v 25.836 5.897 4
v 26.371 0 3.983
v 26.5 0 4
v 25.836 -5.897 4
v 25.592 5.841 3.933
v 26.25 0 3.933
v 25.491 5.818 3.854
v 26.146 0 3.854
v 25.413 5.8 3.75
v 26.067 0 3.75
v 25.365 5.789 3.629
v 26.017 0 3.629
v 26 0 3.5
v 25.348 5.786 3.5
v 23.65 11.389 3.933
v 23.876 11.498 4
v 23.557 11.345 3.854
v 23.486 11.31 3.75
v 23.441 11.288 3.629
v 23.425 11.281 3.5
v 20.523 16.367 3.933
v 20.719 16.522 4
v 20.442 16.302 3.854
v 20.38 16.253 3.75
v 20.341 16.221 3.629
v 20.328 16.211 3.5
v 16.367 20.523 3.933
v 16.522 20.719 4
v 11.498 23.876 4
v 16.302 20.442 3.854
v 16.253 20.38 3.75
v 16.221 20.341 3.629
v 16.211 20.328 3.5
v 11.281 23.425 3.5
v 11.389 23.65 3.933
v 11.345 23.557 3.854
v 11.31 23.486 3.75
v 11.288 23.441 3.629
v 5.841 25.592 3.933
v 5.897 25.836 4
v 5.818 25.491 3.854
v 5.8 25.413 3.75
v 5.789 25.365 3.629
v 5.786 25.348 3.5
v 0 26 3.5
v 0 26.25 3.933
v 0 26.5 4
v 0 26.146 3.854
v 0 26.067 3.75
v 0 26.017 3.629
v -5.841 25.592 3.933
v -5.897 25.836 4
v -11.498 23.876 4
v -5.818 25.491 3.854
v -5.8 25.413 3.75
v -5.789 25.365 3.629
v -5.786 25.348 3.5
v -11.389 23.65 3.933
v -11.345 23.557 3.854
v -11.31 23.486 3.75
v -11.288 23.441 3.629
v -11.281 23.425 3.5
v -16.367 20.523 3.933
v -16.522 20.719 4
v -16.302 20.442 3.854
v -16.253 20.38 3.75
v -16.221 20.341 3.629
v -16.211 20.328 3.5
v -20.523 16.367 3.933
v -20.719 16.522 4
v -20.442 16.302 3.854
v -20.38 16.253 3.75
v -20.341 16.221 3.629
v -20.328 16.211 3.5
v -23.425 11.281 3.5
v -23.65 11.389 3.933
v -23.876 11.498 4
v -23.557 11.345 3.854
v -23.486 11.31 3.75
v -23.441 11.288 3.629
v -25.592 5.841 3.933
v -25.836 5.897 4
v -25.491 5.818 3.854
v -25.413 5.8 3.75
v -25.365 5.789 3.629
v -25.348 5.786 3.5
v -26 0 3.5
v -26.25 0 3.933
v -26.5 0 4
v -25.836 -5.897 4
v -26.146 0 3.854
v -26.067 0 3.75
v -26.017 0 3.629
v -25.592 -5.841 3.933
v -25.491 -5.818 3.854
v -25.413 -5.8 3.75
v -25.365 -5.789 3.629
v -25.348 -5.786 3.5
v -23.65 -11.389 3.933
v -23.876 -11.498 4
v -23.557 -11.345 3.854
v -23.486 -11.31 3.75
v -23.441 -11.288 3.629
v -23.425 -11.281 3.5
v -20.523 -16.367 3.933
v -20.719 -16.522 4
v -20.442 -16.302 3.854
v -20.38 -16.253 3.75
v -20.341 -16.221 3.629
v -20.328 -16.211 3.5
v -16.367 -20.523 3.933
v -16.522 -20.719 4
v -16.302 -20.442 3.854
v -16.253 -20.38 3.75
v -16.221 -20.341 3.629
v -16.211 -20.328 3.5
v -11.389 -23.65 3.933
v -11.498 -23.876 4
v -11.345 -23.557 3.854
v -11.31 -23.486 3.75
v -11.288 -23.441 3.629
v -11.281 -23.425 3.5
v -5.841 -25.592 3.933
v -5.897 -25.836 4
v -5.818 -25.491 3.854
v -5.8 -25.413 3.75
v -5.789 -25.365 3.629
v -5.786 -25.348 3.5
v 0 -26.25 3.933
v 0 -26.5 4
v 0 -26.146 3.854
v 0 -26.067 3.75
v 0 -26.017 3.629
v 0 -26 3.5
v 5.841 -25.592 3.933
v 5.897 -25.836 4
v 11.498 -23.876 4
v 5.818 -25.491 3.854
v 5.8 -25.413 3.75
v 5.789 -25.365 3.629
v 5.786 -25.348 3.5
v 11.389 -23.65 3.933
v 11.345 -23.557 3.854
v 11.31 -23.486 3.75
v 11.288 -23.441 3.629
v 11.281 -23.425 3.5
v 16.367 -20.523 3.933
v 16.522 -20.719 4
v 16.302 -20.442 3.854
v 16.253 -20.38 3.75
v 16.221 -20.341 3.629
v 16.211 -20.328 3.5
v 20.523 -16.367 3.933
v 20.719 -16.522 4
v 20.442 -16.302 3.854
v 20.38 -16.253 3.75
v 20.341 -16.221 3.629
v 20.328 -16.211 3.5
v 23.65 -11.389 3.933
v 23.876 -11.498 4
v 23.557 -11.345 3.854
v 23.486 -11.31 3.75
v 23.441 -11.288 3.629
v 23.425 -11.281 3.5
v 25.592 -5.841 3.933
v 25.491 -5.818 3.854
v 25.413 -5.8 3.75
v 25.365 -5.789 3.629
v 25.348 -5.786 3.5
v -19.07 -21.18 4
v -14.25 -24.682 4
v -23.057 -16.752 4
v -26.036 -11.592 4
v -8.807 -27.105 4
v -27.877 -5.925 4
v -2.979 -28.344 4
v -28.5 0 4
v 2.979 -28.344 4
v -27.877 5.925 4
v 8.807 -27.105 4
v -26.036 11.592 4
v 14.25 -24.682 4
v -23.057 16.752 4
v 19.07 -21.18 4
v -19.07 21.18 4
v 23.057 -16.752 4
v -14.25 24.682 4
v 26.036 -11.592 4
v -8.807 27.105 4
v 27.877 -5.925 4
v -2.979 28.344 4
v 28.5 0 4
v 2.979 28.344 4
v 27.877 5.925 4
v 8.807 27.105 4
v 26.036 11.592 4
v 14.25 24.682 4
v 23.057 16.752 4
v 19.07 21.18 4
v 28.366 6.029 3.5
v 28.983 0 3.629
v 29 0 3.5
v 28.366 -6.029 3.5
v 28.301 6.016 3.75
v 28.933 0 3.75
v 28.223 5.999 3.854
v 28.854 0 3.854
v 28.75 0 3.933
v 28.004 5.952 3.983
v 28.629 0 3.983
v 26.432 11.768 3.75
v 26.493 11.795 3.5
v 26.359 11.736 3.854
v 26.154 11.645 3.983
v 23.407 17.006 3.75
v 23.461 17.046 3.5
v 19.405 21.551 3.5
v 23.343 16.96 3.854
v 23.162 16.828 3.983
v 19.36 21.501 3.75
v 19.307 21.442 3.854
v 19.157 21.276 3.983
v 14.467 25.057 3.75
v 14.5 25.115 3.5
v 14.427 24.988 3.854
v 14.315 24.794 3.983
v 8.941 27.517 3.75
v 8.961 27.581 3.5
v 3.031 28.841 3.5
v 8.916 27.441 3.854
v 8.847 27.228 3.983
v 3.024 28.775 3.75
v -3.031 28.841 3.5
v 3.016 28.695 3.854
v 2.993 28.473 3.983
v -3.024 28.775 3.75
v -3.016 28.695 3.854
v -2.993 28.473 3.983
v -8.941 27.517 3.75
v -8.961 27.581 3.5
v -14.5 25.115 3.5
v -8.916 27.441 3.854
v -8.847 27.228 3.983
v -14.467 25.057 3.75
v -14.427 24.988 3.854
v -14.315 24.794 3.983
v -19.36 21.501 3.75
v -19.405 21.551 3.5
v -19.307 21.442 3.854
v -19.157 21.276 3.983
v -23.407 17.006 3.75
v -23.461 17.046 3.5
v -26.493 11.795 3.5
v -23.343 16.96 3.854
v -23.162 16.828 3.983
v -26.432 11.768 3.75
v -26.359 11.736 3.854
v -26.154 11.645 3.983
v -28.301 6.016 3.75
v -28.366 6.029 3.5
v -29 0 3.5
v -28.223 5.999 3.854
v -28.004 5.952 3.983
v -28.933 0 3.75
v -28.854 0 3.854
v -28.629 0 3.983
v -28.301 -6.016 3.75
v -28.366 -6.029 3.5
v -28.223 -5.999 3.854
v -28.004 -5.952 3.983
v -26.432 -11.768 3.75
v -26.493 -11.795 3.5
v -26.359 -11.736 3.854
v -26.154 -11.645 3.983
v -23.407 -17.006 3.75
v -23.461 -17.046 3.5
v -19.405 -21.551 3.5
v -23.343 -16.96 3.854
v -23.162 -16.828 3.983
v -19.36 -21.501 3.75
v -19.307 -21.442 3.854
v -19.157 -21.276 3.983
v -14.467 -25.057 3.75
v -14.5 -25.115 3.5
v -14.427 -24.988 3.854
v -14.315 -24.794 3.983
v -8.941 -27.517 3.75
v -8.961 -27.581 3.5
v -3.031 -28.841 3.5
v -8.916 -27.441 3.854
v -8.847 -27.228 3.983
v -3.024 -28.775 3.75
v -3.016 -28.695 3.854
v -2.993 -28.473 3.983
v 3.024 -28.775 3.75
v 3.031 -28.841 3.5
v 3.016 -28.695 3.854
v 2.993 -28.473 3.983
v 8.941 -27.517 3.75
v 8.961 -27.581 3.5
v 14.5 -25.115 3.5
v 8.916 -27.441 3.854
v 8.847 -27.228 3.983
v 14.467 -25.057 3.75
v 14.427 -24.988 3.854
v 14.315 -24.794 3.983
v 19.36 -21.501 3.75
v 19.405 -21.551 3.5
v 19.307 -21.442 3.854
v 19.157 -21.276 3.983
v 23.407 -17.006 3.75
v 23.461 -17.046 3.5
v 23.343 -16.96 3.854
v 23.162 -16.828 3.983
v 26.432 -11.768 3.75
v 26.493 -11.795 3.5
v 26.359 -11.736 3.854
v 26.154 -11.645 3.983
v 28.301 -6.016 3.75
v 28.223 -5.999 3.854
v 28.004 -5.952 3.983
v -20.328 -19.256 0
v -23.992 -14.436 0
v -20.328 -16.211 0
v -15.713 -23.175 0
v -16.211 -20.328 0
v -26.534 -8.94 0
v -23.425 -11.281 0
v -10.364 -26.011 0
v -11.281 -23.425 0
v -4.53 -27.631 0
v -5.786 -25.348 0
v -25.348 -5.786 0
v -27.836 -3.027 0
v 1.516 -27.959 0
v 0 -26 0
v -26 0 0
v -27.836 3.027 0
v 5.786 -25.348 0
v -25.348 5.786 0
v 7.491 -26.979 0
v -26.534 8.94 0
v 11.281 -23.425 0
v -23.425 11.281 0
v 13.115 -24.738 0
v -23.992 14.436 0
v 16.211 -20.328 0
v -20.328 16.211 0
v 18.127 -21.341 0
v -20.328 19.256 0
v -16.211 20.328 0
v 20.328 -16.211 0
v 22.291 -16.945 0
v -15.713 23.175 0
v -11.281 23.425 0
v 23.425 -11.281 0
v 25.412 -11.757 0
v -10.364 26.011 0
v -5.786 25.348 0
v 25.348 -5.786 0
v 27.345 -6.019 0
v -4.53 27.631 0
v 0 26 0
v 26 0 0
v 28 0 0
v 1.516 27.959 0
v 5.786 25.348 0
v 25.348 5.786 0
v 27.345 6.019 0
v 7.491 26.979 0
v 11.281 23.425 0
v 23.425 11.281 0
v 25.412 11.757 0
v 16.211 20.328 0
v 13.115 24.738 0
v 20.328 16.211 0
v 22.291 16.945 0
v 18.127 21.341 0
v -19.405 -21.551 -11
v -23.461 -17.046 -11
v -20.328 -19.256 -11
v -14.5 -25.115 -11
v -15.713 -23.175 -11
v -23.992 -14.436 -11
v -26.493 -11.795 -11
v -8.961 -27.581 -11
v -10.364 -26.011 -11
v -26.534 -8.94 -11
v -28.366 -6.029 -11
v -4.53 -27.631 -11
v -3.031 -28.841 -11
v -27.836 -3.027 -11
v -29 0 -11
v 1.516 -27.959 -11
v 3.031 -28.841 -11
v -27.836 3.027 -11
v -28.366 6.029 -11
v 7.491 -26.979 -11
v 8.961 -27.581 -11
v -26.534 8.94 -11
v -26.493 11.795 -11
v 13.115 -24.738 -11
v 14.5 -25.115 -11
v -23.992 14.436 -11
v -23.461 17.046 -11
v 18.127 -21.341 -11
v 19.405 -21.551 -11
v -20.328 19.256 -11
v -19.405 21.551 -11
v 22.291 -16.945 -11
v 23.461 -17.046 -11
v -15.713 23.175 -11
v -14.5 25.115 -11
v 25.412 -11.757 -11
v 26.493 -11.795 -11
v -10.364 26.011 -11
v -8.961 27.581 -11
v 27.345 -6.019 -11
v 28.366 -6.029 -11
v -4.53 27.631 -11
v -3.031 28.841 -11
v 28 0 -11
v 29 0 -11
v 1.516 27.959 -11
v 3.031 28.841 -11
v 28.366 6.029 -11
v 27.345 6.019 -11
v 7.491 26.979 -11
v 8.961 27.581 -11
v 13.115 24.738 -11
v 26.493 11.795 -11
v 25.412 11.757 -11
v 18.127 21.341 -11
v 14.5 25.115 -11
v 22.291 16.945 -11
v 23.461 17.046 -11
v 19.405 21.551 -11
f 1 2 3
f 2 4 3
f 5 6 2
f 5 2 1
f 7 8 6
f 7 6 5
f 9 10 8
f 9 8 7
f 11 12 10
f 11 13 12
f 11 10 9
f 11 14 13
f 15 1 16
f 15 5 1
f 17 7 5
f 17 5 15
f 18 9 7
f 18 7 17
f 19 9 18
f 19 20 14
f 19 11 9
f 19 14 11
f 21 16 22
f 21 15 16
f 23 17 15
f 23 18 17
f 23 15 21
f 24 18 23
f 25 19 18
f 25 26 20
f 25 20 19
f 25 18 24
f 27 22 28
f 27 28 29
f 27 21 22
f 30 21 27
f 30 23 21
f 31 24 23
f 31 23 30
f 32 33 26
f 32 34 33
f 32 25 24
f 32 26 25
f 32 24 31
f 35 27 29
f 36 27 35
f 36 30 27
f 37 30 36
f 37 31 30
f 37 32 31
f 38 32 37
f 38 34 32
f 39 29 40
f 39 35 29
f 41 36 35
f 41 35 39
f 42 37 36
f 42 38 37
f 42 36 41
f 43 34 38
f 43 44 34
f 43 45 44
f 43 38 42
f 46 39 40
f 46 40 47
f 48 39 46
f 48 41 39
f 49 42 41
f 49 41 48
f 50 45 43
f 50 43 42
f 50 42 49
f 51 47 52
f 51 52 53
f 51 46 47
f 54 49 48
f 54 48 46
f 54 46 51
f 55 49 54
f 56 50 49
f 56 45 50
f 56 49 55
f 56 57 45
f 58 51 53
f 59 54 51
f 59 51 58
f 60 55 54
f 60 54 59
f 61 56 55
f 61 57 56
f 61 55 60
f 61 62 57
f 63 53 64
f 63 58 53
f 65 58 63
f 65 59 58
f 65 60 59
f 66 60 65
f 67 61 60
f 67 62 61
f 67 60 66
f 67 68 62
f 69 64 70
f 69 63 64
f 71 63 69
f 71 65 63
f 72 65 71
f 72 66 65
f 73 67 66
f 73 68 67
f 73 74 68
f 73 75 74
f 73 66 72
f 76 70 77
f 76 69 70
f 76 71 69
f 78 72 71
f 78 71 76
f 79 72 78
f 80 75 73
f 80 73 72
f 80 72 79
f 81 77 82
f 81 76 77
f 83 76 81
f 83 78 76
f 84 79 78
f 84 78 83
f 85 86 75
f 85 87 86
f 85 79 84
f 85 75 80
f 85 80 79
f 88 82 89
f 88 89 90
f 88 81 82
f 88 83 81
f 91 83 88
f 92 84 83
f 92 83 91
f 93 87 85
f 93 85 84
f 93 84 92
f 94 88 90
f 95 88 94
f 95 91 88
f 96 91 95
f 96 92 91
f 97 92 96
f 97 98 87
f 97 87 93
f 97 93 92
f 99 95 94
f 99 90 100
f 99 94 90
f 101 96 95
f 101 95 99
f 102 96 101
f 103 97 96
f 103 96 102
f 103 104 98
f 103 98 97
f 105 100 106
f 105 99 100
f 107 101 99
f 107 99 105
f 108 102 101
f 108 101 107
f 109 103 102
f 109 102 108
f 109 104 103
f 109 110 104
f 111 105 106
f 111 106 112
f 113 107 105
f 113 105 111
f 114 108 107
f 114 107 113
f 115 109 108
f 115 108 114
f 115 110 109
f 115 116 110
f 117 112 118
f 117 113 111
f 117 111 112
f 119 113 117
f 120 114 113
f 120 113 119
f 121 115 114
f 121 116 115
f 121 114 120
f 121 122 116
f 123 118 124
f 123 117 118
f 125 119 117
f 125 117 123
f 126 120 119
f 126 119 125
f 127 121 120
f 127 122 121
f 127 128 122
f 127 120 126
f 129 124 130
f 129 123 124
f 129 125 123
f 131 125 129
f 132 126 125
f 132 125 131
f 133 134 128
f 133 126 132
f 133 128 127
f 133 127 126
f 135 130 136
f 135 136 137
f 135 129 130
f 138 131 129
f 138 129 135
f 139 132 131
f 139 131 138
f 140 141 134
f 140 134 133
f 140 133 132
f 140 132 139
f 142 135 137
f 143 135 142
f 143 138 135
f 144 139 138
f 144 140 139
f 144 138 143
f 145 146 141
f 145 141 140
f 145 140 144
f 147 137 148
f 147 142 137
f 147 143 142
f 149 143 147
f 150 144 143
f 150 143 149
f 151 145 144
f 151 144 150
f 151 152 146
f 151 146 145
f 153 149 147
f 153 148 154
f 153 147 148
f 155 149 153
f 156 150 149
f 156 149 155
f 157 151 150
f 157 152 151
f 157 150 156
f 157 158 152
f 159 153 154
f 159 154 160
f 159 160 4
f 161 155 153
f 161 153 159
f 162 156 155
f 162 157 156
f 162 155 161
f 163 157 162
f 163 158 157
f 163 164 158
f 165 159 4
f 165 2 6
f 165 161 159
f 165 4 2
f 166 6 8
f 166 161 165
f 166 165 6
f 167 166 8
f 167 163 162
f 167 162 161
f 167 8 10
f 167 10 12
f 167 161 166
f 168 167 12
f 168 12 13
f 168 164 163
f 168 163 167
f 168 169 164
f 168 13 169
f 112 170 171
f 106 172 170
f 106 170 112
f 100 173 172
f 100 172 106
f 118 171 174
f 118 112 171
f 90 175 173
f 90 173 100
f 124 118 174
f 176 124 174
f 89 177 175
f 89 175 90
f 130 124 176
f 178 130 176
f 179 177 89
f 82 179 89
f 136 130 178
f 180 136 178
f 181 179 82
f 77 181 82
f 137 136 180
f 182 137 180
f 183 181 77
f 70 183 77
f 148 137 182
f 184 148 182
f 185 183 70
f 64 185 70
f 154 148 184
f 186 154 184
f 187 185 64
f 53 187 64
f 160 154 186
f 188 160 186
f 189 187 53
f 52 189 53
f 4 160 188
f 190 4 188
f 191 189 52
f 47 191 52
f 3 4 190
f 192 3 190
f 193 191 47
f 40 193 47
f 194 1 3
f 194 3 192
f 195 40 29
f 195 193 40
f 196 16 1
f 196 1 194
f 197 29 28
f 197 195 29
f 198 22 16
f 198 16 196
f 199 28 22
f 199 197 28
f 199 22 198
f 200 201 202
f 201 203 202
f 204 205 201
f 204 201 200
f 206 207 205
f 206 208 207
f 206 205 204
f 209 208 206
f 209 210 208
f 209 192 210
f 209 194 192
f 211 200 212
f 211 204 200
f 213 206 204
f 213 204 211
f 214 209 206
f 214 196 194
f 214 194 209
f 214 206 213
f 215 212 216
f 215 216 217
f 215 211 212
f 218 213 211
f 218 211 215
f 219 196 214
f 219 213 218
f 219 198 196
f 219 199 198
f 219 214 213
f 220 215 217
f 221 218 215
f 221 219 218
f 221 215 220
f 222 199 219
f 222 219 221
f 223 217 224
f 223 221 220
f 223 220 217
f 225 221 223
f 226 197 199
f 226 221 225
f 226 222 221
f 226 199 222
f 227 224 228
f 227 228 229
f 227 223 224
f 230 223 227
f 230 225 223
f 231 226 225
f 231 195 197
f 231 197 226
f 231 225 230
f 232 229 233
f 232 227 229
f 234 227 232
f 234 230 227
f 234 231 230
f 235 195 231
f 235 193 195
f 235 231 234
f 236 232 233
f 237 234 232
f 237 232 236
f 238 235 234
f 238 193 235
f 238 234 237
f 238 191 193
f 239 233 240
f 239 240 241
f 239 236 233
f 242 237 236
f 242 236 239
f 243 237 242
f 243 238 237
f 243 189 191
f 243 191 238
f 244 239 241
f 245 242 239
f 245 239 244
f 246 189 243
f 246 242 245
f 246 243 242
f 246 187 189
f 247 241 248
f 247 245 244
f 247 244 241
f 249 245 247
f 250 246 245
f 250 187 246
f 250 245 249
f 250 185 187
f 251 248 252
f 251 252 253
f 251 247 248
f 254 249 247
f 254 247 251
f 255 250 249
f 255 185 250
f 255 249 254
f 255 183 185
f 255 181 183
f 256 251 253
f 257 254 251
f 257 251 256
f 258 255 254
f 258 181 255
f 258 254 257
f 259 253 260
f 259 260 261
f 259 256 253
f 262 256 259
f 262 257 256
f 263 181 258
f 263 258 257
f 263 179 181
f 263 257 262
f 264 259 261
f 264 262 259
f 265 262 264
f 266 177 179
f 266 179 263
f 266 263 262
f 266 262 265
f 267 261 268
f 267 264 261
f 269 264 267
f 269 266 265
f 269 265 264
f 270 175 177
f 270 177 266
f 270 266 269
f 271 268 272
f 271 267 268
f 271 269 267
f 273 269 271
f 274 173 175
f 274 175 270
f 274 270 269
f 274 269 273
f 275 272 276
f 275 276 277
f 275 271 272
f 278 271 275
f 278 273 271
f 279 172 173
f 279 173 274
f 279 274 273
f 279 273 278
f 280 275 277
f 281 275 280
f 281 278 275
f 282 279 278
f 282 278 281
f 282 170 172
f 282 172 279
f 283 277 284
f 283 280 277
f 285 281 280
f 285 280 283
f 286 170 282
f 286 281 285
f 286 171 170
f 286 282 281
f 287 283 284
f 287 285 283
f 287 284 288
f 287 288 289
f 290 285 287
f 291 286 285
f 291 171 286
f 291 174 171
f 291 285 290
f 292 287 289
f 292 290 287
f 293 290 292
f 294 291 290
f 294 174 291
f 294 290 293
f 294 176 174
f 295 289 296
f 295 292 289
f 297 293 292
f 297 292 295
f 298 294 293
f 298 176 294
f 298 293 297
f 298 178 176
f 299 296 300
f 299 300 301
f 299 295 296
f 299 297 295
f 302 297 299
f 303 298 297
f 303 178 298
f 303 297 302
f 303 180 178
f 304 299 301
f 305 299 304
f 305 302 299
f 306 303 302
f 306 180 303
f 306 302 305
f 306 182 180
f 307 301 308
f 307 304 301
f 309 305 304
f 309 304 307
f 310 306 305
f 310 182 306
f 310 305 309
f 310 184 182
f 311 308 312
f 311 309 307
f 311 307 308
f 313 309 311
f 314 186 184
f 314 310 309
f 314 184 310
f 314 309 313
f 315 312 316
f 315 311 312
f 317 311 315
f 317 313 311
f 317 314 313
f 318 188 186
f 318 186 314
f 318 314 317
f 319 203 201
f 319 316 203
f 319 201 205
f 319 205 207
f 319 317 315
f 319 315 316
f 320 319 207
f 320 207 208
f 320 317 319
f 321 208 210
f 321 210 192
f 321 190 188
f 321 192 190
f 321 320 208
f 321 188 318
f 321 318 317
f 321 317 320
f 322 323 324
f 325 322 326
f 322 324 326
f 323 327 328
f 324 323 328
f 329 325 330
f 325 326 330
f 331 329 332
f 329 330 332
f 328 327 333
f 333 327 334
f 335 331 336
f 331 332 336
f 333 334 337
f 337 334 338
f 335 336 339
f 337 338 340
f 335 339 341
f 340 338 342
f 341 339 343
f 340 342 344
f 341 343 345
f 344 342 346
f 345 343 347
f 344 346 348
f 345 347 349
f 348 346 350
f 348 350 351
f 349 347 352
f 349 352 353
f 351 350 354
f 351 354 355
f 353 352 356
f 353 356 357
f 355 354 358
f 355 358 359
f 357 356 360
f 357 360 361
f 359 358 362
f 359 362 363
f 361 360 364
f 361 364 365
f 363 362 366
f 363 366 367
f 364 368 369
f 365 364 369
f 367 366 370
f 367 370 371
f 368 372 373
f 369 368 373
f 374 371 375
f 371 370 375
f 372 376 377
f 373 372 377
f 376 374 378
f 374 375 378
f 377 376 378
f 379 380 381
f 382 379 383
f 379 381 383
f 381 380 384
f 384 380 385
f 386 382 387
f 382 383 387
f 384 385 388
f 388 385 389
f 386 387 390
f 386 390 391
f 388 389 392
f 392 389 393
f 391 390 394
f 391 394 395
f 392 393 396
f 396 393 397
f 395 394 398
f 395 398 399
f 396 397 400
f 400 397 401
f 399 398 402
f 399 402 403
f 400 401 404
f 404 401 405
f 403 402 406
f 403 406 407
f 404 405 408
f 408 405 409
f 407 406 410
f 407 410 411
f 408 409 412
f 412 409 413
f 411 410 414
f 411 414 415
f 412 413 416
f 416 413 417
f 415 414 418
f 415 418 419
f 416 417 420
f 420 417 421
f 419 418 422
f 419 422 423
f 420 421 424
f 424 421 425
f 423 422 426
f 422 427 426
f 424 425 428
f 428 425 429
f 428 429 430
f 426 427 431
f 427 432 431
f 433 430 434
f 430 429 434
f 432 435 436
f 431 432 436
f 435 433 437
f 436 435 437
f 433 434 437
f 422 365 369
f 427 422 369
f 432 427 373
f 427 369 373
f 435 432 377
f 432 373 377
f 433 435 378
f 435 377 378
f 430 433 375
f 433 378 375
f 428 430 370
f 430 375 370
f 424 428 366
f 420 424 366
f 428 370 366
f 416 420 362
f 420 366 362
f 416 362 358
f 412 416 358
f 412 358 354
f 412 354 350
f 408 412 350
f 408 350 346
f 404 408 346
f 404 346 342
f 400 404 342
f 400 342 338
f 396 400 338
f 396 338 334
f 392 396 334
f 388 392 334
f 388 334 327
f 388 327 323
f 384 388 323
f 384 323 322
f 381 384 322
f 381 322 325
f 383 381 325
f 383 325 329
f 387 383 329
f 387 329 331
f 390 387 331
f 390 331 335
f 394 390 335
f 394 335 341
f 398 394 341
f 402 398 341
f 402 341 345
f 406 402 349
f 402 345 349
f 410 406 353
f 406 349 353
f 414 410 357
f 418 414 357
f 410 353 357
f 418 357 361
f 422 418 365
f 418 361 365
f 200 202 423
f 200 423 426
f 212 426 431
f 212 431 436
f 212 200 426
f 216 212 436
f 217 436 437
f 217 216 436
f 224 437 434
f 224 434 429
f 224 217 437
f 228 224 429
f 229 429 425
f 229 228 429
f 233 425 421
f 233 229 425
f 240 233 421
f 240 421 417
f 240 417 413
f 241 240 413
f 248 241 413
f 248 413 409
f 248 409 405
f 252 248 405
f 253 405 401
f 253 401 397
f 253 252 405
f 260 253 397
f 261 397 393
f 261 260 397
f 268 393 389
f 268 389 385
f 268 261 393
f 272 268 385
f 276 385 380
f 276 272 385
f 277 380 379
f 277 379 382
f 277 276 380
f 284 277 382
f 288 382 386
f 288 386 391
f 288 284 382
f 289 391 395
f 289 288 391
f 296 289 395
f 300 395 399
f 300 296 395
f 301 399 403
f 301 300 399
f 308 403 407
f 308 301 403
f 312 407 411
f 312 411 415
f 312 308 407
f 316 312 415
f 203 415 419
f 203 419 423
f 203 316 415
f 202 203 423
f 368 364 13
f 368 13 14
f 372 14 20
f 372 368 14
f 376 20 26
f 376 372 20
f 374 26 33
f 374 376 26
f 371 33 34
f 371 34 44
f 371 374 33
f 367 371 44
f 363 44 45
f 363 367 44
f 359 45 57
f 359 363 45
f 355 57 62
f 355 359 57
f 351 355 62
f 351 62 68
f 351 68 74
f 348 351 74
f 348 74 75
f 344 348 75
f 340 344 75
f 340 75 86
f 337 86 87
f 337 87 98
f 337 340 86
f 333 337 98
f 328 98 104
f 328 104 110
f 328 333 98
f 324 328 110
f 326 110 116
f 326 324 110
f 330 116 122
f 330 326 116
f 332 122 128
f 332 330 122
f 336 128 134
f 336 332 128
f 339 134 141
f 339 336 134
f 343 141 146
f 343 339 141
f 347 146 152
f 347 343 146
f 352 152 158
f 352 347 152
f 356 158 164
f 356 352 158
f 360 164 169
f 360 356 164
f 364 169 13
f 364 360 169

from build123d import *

# Parameters (mm, degrees)
F0_R     = 28
F0_R_2   = 26
F1_DEPTH = 4
F2_R     = 29
F2_R_2   = 28
F3_DEPTH = 15
F4_R     = 0.5


with BuildPart() as f1:
    # F0 (on Top) → F1 (new body)
    with BuildSketch(Plane.XY):
        Circle(F0_R)
        Circle(F0_R_2, mode=Mode.SUBTRACT)
    extrude(amount=F1_DEPTH)

    # F2 (on face) → F3 (join)
    with BuildSketch(Plane.XY.offset(4)):
        Circle(F2_R)
        Circle(F2_R_2, mode=Mode.SUBTRACT)
    extrude(amount=-F3_DEPTH)

    # F4
    f4_edges = [f1.edges().sort_by_distance(p)[0] for p in [
        (-26, 0, 4),
        (-29, 0, 4),
    ]]
    fillet(f4_edges, radius=F4_R)


solid = f1.part
